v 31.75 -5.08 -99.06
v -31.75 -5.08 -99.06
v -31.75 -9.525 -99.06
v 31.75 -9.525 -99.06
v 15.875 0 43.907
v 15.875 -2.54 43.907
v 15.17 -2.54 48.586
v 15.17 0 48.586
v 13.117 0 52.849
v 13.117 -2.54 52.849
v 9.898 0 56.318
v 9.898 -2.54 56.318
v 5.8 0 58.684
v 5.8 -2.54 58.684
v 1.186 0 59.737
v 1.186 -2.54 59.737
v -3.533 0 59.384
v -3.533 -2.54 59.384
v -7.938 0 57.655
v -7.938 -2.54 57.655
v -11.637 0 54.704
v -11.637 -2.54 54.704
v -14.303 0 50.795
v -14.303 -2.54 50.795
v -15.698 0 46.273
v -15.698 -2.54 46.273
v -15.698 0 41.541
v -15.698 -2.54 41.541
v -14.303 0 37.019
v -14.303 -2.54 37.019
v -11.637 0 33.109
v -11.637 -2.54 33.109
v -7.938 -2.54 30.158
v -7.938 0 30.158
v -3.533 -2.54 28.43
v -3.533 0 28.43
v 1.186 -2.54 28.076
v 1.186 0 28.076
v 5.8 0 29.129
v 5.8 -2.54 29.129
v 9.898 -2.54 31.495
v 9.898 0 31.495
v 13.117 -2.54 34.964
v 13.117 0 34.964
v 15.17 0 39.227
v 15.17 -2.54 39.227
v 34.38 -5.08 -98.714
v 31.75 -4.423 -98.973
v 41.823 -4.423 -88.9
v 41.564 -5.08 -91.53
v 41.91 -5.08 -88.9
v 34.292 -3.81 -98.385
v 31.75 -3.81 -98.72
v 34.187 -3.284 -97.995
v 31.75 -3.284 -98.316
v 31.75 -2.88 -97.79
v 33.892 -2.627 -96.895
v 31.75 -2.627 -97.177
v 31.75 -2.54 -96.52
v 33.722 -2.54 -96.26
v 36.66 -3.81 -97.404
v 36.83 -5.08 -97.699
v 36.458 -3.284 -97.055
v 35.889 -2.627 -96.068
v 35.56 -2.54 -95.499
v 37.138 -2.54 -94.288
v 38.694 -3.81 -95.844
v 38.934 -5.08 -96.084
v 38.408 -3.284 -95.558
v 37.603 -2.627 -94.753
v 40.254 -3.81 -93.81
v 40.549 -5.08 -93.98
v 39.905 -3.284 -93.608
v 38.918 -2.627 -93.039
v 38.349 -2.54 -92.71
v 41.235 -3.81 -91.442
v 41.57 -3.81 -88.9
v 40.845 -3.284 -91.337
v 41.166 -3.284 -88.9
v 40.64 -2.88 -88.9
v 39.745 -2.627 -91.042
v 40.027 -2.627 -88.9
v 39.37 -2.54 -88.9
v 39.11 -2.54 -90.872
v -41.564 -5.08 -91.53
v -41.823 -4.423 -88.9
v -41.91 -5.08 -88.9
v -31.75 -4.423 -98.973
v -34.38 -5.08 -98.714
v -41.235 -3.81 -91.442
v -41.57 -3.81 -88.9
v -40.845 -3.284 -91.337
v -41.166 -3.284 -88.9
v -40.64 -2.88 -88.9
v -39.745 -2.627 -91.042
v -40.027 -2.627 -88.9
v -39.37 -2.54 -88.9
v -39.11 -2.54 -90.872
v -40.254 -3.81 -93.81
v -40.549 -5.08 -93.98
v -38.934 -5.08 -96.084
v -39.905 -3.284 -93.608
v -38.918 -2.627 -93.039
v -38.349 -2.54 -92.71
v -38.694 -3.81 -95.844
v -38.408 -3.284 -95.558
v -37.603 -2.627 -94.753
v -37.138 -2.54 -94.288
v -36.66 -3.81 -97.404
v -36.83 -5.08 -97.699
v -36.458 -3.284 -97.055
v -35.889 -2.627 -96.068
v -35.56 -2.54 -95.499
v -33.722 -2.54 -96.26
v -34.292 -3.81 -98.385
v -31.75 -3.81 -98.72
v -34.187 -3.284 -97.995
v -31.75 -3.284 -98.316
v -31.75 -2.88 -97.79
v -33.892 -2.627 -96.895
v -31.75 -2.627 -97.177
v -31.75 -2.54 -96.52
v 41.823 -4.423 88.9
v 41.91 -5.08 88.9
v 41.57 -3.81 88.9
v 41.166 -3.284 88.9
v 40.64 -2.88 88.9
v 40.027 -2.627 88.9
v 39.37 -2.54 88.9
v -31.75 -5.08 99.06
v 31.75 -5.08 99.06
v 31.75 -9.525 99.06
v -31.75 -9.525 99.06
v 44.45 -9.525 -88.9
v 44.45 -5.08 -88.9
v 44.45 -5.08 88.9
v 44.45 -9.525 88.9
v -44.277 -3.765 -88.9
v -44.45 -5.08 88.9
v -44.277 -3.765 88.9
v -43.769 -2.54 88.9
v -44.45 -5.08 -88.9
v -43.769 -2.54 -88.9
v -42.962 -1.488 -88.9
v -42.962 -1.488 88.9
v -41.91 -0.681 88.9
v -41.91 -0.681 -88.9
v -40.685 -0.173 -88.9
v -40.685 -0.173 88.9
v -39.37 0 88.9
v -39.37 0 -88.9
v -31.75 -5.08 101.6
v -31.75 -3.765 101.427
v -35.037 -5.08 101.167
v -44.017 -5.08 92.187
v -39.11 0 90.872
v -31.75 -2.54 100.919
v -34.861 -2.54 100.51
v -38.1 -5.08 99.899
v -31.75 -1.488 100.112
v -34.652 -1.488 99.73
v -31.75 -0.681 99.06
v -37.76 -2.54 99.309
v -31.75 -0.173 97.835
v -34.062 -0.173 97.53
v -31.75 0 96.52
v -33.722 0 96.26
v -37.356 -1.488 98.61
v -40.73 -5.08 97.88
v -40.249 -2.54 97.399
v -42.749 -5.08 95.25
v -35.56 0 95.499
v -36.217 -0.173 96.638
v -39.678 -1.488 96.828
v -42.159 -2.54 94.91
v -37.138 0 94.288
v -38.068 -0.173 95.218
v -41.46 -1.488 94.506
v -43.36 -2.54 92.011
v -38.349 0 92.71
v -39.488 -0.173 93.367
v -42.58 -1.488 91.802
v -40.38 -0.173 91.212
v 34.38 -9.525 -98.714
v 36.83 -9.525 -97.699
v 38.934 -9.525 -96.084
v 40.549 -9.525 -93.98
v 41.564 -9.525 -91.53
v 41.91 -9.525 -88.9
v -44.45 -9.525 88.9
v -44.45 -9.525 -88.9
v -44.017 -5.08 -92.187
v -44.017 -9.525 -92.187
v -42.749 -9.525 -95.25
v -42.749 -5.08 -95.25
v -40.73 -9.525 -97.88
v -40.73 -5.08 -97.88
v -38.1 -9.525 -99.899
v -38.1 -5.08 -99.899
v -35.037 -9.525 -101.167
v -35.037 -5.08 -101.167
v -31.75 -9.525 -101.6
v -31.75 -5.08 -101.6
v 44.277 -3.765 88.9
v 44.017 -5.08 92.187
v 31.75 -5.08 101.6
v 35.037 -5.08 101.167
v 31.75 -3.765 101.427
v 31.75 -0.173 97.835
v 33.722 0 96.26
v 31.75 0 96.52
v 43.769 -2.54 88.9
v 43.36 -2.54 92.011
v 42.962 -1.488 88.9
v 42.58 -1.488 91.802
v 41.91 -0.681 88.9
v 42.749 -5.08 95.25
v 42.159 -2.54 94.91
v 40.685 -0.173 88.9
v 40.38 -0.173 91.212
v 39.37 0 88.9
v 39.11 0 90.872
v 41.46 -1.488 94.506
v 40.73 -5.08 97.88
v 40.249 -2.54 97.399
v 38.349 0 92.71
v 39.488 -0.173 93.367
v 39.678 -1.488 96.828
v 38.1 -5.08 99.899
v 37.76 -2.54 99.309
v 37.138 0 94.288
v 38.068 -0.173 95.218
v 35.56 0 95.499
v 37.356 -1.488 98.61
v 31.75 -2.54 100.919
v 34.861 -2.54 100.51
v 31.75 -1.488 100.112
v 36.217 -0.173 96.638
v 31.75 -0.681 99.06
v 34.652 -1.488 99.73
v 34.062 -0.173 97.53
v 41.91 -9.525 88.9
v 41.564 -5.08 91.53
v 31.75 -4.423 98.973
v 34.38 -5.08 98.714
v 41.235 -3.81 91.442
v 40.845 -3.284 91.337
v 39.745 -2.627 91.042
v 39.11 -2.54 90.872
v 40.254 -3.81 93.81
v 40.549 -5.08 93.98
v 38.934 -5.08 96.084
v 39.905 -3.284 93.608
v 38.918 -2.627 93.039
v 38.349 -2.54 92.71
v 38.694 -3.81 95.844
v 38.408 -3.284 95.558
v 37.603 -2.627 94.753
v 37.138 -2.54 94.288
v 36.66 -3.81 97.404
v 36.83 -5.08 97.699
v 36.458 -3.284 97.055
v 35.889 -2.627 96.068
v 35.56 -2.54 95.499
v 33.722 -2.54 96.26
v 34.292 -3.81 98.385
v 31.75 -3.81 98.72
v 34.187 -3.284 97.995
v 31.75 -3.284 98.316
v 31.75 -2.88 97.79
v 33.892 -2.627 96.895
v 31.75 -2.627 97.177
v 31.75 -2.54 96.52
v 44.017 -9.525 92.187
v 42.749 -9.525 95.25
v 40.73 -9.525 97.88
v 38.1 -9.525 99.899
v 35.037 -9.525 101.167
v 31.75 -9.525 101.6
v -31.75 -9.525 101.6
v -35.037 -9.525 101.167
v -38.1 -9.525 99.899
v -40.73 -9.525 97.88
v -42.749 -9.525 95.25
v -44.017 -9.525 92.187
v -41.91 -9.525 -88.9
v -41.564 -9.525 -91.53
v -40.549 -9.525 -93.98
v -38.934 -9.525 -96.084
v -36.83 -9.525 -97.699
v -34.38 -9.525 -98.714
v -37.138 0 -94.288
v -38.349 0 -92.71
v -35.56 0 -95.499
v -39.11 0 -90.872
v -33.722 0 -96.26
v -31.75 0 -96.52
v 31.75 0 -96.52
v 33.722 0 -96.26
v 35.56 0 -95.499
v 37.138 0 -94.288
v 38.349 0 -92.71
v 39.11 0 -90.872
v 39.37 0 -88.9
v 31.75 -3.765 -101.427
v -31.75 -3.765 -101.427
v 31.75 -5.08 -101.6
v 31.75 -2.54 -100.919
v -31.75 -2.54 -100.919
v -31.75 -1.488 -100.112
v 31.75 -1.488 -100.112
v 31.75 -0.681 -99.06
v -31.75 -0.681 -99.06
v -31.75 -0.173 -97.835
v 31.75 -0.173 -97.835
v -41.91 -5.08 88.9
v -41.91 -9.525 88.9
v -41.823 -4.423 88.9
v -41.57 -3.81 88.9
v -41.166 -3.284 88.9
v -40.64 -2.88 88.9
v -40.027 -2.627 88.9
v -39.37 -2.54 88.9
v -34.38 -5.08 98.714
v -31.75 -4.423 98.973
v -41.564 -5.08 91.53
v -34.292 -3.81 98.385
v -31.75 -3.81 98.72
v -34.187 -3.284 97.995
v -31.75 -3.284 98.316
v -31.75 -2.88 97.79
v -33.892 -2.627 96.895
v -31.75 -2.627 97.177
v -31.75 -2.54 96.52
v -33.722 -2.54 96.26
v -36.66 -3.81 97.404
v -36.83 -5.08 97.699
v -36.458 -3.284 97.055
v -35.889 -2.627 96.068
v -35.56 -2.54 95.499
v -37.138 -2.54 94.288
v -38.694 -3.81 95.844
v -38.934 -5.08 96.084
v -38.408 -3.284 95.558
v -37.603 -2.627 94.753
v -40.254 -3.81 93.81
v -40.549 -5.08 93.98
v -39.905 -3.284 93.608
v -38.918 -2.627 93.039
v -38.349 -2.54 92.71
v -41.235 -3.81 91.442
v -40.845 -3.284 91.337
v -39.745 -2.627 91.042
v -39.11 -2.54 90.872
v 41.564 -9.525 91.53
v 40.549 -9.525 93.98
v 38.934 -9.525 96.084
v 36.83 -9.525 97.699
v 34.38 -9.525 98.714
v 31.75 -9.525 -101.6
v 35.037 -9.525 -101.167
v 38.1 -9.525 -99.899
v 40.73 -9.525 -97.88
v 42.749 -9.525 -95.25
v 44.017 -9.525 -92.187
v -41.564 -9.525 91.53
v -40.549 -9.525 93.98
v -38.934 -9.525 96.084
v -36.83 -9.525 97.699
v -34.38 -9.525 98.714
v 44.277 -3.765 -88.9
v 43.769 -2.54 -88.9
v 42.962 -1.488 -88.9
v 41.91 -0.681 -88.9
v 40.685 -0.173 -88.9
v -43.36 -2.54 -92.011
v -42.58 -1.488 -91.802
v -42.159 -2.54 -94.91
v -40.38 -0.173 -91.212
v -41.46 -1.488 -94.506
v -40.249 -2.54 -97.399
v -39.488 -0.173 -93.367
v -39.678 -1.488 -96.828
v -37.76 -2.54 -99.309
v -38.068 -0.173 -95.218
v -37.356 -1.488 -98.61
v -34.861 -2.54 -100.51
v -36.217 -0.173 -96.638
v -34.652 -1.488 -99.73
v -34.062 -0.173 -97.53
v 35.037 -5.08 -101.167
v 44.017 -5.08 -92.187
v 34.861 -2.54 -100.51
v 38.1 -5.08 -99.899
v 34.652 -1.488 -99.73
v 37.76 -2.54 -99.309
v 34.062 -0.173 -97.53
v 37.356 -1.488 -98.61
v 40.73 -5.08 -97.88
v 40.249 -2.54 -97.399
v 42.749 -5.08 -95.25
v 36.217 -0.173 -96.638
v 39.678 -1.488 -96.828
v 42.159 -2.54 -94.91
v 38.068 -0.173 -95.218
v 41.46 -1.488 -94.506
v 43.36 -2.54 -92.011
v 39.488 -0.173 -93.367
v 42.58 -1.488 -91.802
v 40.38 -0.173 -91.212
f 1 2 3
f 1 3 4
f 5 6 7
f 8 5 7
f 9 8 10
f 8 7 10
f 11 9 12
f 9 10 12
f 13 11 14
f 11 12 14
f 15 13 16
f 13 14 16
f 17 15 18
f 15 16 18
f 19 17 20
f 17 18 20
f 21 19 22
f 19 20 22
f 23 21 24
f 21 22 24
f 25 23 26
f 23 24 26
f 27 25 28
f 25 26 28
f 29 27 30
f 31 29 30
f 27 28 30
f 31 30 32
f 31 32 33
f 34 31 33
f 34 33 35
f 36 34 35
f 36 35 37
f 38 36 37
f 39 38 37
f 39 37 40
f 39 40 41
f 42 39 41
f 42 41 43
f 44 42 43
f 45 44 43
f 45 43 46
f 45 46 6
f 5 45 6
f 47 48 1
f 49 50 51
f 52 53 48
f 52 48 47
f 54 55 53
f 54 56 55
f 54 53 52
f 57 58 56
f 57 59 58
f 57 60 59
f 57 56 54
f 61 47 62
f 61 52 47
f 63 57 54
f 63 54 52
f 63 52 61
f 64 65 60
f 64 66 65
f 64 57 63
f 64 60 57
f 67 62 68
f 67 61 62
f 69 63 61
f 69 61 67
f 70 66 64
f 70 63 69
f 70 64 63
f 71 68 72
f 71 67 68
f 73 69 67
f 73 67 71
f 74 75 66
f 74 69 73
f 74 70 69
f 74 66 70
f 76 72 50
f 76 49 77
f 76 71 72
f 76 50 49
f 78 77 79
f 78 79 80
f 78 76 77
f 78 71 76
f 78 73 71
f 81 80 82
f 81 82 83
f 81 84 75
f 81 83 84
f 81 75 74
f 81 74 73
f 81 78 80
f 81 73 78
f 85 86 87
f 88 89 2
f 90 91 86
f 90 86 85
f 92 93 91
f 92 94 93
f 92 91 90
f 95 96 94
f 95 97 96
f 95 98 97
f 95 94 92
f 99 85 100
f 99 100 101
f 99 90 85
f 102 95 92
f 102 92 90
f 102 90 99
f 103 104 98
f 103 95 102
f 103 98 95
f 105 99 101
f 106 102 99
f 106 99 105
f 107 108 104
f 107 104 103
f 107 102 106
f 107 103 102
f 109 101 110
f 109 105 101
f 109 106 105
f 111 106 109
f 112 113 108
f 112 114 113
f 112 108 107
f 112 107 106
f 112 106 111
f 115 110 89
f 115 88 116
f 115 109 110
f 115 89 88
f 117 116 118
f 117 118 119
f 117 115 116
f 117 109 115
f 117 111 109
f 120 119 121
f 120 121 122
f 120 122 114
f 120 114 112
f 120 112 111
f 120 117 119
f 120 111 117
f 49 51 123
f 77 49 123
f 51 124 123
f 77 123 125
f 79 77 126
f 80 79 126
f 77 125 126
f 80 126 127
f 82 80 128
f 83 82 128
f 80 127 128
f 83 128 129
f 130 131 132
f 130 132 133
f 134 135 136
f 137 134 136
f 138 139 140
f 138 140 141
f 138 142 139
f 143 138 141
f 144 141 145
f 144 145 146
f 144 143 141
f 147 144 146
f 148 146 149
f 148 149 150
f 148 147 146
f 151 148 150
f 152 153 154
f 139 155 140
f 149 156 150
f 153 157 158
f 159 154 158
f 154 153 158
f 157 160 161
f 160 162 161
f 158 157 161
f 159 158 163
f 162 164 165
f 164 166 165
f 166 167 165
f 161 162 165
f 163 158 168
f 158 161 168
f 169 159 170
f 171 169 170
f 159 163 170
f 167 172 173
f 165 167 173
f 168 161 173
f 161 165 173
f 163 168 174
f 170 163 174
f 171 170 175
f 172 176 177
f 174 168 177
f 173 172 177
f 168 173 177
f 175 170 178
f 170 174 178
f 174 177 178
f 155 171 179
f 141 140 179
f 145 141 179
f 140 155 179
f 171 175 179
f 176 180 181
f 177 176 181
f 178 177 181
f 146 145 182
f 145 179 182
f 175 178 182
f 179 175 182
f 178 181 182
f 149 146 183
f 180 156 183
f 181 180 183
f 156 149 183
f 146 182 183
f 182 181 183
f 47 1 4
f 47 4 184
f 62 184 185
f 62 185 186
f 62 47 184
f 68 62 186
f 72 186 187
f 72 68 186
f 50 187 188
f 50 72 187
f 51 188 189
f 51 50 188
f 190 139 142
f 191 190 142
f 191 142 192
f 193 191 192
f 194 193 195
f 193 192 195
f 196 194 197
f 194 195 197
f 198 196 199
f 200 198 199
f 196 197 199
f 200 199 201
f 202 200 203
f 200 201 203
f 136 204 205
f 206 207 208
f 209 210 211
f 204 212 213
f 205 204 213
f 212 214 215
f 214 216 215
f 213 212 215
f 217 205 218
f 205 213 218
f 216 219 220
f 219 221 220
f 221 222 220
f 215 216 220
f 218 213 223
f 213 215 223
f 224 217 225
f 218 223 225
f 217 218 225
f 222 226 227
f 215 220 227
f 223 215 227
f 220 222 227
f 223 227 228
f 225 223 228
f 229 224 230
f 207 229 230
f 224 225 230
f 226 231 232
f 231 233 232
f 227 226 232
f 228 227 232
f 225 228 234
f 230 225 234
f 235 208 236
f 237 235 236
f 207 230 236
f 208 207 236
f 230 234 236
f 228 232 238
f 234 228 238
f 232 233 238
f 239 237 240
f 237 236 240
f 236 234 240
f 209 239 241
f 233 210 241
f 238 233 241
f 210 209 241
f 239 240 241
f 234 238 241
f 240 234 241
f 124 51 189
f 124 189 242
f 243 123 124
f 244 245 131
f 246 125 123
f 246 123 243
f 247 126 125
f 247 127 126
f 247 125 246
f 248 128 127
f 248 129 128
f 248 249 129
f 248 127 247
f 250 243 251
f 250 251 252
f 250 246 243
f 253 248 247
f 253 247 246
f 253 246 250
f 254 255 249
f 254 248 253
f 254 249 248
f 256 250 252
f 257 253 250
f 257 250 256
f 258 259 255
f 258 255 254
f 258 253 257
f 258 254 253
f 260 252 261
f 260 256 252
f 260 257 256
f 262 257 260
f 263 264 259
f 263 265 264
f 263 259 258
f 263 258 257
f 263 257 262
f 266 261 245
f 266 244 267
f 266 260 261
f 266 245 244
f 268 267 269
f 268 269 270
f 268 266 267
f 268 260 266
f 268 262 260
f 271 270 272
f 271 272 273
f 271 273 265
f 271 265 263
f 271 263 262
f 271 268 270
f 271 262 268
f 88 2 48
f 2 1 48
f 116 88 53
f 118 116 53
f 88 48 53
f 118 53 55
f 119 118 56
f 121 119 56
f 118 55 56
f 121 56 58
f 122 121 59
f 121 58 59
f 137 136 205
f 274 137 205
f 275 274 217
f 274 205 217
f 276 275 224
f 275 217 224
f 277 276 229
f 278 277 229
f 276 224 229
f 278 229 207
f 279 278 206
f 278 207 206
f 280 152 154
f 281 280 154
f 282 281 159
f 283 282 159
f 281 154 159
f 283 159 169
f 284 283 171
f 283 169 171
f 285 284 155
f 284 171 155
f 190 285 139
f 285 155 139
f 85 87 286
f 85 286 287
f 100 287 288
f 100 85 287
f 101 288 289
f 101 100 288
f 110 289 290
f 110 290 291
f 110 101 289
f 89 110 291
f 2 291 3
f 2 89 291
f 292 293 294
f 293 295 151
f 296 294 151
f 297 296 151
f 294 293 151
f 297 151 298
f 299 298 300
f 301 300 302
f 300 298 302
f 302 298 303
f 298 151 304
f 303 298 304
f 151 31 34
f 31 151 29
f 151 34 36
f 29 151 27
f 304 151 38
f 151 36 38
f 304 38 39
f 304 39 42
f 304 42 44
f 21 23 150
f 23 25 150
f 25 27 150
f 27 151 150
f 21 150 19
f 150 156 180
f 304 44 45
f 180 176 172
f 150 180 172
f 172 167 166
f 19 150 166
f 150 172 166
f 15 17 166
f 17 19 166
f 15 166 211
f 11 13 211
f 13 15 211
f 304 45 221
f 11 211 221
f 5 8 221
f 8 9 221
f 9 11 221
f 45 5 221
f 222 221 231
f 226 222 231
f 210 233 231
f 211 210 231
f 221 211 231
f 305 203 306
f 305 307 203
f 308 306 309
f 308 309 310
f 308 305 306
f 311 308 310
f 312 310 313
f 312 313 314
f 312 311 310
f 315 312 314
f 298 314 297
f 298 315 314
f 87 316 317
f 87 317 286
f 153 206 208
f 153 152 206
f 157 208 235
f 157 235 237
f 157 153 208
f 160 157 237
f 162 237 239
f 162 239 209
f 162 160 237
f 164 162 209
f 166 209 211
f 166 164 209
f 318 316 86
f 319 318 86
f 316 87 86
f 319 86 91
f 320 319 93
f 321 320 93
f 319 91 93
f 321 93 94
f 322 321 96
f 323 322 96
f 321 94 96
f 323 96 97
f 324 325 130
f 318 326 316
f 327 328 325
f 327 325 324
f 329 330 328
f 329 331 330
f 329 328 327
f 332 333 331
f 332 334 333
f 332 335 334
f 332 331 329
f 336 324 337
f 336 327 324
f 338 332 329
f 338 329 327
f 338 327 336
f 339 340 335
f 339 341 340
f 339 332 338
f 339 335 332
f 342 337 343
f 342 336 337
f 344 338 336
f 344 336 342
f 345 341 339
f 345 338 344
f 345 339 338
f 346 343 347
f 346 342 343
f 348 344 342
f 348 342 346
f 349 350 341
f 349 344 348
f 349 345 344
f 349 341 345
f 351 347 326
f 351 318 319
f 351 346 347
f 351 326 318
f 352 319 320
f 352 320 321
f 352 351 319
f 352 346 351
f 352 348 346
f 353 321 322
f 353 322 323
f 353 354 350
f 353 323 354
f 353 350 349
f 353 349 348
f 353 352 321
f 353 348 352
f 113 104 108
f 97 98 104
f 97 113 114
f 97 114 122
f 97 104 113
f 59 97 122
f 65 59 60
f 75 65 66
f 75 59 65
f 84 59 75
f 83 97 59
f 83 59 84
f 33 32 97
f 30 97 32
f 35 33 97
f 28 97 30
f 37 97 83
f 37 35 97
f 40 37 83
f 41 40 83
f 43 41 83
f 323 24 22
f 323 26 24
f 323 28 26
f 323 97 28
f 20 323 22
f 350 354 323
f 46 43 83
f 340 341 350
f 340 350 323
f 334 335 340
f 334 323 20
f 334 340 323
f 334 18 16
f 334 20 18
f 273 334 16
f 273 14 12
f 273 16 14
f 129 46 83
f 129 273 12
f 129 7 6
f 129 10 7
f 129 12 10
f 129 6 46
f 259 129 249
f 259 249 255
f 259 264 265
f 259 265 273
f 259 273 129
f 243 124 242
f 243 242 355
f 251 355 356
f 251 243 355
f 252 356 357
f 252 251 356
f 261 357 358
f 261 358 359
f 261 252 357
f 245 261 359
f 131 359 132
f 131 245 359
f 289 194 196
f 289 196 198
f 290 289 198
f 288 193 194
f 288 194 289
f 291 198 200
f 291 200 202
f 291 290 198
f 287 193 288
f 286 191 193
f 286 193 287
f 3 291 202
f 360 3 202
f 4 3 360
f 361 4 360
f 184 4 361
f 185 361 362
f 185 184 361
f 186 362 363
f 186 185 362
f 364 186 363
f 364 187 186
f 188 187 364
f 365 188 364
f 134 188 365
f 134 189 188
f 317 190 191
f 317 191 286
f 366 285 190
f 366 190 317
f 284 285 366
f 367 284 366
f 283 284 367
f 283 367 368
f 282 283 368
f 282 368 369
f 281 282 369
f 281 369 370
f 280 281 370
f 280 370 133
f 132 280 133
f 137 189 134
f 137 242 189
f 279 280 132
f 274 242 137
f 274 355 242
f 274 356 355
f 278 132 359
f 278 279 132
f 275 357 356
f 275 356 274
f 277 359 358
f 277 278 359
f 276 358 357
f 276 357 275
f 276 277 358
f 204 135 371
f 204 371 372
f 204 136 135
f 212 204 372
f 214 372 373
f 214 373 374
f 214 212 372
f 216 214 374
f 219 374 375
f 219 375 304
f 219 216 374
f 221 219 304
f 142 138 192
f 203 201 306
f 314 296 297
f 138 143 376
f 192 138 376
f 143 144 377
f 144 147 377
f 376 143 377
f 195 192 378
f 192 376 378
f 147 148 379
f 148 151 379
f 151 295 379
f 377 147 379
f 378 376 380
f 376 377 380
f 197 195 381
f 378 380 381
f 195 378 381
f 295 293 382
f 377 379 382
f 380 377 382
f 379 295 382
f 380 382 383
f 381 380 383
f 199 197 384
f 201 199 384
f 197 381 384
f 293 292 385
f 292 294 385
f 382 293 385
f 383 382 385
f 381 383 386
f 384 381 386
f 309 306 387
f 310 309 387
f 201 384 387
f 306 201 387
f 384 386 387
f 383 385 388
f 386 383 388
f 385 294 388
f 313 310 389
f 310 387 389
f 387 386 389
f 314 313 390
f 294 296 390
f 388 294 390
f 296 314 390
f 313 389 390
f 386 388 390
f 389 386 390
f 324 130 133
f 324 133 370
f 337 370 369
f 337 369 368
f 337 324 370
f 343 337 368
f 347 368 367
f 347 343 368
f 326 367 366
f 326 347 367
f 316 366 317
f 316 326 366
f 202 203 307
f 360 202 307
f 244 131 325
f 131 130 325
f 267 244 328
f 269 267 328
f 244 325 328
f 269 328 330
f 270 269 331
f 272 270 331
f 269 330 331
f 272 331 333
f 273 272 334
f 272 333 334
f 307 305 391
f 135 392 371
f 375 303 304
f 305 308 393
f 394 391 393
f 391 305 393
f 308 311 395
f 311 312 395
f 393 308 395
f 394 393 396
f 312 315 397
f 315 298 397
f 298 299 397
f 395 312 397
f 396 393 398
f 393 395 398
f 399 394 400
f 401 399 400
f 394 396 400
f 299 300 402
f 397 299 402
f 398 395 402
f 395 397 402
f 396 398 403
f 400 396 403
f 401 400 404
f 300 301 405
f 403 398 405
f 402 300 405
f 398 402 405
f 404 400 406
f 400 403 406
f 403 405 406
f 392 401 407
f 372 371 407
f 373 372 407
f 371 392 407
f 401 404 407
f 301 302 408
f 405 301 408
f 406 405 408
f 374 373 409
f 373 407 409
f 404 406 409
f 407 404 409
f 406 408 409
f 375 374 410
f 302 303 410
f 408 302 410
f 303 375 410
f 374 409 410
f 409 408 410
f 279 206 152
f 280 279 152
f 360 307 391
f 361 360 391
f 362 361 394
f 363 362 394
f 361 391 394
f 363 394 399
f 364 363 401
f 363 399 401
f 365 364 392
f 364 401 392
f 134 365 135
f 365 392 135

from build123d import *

# Parameters (mm, degrees)
F1_DEPTH = 9.525
F2_R     = 5.08
F3_T     = -2.54
F4_R     = 15.875
F5_DEPTH = 25.4


with BuildPart() as f1:
    # F0 (on Front) → F1 (new body)
    with BuildSketch(Plane.XZ):
        with BuildLine():
            Line((31.75, 101.6), (-31.75, 101.6))
            ThreePointArc((-31.75, 101.6), (-40.730256, 97.880256), (-44.45, 88.9))
            Line((-44.45, 88.9), (-44.45, -88.9))
            ThreePointArc((-44.45, -88.9), (-40.730256, -97.880256), (-31.75, -101.6))
            Line((-31.75, -101.6), (31.75, -101.6))
            ThreePointArc((31.75, -101.6), (40.730256, -97.880256), (44.45, -88.9))
            Line((44.45, -88.9), (44.45, 88.9))
            ThreePointArc((44.45, 88.9), (40.730256, 97.880256), (31.75, 101.6))
        make_face()
    extrude(amount=F1_DEPTH)

    # F2
    f2_edges = [f1.edges().sort_by_distance(p)[0] for p in [
        (0, 0, 101.6),
        (-40.730256, 0, 97.880256),
        (-44.45, 0, 0),
        (-40.730256, 0, -97.880256),
        (0, 0, -101.6),
        (40.730256, 0, -97.880256),
        (44.45, 0, 0),
        (40.730256, 0, 97.880256),
    ]]
    fillet(f2_edges, radius=F2_R)

    # F3
    f3_openings = [f1.faces().sort_by_distance(p)[0] for p in [
        (0, -9.525, 0),
    ]]
    offset(amount=F3_T, openings=f3_openings)

    # F4 (on face) → F5 (cut)
    with BuildSketch(Plane.XZ.offset(2.54)):
        with Locations((0, 43.90662)):
            Circle(F4_R)
    extrude(amount=-F5_DEPTH, mode=Mode.SUBTRACT)


solid = f1.part
